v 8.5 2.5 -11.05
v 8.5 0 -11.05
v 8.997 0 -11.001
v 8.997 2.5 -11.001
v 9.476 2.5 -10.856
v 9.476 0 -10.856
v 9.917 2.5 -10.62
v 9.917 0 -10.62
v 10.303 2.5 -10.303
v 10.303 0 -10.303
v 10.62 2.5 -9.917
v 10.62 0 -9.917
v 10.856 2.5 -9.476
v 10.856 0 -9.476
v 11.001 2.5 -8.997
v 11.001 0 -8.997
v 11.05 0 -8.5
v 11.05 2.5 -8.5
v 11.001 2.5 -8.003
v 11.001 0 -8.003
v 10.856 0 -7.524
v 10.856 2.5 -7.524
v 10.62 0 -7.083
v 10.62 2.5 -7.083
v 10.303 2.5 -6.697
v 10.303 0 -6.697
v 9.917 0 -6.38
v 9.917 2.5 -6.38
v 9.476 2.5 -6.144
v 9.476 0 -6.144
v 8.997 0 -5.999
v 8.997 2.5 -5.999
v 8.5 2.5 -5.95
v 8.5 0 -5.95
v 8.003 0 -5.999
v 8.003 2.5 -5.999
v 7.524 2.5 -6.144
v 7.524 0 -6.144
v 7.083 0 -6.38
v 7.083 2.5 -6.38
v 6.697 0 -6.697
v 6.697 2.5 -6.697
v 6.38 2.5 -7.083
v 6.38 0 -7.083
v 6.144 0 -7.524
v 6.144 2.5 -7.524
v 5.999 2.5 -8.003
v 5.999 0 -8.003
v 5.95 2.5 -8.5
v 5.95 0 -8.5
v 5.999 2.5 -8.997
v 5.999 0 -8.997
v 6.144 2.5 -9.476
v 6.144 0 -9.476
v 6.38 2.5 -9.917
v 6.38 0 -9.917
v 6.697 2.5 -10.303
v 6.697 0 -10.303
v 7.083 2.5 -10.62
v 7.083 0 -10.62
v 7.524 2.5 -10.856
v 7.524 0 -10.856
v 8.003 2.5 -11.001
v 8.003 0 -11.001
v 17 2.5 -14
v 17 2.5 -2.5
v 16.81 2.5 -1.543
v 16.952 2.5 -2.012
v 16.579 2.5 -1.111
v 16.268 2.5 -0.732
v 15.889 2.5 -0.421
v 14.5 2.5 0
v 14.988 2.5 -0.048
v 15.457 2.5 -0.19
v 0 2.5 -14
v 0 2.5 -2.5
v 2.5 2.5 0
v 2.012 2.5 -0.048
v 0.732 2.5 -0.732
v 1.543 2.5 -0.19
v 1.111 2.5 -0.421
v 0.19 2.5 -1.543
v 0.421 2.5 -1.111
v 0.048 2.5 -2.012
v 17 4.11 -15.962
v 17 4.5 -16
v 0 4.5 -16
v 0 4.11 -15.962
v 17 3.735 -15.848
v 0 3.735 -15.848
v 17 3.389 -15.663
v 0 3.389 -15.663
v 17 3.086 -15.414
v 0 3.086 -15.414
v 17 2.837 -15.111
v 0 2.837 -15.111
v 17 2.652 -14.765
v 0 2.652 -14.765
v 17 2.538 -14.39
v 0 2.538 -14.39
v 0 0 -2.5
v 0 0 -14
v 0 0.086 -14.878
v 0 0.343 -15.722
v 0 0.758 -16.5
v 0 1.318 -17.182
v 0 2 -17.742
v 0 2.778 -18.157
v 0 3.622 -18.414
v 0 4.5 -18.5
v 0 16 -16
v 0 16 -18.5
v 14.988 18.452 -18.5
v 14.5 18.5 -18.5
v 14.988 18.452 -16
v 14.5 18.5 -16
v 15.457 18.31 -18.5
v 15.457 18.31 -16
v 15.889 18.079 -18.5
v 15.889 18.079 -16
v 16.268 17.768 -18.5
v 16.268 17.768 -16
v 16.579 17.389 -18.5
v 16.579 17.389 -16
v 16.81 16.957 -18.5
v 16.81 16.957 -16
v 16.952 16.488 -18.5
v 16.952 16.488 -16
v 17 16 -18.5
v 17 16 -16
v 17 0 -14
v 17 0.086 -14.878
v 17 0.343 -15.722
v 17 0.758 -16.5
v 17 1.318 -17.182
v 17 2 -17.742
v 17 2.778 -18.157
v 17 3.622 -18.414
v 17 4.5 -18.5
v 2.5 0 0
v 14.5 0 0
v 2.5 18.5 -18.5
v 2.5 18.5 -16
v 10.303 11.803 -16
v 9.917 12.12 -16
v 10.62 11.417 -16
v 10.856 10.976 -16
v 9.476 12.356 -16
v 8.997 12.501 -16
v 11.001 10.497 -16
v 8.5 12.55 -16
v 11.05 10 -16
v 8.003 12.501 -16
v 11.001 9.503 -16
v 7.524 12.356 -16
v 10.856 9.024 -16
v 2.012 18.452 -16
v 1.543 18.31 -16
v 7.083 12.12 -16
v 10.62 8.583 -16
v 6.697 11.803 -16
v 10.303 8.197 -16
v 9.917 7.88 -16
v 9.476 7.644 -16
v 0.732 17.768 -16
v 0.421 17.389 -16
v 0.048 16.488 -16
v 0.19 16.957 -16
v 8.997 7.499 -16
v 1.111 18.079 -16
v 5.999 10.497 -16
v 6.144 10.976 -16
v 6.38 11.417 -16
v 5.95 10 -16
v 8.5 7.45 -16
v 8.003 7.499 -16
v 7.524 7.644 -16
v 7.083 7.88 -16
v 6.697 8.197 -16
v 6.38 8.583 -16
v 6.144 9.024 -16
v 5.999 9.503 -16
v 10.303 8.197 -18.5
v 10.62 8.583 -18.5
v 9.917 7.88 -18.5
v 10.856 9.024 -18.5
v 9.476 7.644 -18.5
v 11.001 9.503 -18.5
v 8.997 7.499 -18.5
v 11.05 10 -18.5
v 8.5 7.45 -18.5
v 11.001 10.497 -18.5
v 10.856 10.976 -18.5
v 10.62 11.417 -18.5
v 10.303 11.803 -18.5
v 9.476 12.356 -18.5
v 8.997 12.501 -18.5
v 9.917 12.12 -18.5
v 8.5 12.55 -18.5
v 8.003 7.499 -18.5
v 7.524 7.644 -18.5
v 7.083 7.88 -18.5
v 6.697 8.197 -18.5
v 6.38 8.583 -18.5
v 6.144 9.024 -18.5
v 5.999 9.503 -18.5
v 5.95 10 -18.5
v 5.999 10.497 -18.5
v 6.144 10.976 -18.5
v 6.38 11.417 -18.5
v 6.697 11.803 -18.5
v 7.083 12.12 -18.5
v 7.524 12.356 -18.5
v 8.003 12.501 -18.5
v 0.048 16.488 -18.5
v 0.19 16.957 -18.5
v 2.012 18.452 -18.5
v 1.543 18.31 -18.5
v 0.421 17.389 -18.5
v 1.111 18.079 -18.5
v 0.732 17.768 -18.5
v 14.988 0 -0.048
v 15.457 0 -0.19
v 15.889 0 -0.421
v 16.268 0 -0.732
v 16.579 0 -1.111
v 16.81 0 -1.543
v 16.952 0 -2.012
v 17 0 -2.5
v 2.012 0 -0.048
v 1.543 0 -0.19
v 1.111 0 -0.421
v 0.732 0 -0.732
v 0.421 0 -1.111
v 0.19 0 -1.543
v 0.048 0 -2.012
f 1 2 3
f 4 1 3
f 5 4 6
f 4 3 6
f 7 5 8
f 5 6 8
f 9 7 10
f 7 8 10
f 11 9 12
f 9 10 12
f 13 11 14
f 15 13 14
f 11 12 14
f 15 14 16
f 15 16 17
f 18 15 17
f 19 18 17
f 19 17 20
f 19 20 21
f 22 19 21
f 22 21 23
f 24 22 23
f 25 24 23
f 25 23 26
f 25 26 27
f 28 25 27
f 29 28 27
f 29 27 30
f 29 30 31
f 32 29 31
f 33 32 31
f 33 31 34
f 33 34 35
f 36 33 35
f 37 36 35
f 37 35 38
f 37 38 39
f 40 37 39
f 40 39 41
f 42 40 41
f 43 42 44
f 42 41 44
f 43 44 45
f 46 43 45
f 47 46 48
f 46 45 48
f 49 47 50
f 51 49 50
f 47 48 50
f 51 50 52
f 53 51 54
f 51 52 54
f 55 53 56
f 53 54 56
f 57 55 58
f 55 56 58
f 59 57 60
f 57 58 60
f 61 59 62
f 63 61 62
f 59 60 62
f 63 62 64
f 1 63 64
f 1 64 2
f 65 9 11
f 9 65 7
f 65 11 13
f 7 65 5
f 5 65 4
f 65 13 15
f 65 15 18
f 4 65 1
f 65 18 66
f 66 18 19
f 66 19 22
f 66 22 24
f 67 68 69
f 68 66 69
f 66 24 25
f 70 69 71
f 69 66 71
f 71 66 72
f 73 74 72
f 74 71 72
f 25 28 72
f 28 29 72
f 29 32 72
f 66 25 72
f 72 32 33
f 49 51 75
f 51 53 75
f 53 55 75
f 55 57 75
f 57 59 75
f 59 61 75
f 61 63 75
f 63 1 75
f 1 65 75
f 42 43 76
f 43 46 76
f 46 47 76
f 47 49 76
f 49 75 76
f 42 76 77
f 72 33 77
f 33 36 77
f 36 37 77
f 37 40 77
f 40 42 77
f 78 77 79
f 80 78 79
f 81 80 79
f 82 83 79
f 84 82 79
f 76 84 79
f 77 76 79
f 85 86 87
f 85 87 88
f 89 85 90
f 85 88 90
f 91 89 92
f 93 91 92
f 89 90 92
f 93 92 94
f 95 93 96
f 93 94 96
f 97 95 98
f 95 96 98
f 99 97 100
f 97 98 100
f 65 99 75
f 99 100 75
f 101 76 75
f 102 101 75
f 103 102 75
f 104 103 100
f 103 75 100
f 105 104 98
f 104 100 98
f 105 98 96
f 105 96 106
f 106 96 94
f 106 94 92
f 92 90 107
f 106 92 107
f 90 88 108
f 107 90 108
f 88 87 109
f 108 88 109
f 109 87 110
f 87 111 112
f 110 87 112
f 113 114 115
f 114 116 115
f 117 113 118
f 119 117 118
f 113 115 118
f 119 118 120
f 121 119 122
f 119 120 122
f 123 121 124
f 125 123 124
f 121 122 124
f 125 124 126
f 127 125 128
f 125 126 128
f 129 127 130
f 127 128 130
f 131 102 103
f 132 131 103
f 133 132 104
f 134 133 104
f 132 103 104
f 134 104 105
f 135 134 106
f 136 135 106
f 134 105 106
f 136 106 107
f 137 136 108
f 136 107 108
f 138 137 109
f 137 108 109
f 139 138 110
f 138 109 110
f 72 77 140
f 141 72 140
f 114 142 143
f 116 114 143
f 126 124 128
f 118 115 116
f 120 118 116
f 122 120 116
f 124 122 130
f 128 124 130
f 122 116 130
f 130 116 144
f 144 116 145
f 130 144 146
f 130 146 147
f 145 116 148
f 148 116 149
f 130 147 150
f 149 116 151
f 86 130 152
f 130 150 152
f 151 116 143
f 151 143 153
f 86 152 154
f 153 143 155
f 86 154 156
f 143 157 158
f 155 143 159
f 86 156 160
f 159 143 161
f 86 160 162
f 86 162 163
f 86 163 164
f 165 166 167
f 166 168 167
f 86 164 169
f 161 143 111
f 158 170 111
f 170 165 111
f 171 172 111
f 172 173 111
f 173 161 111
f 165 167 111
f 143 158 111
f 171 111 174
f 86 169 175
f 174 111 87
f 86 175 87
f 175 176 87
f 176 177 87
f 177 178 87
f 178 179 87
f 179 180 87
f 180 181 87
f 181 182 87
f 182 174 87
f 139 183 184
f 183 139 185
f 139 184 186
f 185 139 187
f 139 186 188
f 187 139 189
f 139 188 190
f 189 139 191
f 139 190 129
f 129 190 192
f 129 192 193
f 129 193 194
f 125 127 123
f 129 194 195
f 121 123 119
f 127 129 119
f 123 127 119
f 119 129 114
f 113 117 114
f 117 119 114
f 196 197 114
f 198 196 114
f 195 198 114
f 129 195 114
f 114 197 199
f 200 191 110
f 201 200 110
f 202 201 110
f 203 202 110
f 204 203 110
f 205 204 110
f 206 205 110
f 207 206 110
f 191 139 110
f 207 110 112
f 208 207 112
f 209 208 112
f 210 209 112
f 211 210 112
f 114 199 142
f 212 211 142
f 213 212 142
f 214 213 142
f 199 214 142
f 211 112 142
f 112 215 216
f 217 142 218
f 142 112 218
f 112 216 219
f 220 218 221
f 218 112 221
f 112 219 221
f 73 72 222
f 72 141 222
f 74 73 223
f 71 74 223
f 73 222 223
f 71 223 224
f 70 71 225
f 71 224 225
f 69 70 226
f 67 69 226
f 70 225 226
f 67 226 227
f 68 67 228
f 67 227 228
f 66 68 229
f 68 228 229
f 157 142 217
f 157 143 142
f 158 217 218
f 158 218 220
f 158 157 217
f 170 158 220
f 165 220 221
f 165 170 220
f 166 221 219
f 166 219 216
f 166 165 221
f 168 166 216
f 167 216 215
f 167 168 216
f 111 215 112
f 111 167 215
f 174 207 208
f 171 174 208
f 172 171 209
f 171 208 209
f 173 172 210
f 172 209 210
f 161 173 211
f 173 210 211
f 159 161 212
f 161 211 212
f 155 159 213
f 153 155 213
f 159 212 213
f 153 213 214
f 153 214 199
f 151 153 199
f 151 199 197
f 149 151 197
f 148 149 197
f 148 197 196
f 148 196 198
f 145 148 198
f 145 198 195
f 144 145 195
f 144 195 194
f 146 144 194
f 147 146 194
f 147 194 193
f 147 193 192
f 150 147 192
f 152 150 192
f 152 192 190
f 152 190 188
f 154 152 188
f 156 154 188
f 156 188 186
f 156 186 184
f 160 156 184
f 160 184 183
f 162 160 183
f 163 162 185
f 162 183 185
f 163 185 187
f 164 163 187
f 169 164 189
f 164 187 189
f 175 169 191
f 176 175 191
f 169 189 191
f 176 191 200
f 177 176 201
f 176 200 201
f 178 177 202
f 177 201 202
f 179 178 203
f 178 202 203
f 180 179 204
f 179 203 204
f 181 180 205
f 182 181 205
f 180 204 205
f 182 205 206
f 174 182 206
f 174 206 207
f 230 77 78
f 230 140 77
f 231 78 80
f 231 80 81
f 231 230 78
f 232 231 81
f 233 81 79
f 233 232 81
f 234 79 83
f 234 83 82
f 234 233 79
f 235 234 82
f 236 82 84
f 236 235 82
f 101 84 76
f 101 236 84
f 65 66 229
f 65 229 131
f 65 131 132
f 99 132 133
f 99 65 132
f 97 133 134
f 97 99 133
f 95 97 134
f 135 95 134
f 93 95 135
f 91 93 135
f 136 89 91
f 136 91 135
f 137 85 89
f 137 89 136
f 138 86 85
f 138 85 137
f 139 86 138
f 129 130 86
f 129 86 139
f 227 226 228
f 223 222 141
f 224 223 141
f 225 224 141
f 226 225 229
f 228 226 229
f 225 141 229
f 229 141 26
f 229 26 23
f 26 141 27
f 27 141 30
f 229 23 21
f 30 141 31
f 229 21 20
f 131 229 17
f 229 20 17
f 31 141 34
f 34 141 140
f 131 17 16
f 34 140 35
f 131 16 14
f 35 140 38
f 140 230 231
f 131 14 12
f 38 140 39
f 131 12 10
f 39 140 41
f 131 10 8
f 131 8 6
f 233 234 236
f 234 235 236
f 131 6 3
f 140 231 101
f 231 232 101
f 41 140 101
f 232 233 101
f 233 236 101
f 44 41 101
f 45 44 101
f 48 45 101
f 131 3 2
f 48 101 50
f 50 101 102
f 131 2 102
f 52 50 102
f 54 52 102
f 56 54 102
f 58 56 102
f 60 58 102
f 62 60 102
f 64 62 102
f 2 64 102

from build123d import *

# Parameters (mm, degrees)
EXTRUDE_1_DEPTH     = 17
FILLET_1_R          = 2.5
SKETCH_2_R          = 2.55
CUT_EXTRUDE_1_DEPTH = 17
SKETCH_3_R          = 2.55
CUT_EXTRUDE_2_DEPTH = 17


with BuildPart() as part:
    # Эскиз1 → Бобышка-Вытянуть1 (new body)
    with BuildSketch(Plane(origin=(0, 0, 0), x_dir=(0, 0, -1), z_dir=(1, 0, 0))):
        with BuildLine():
            Line((14, 2.5), (0, 2.5))
            Line((0, 2.5), (0, 0))
            Line((0, 0), (14, 0))
            ThreePointArc((14, 0), (17.181980515, 1.318019485), (18.5, 4.5))
            Line((18.5, 4.5), (18.5, 18.5))
            Line((18.5, 18.5), (16, 18.5))
            Line((16, 18.5), (16, 4.5))
            ThreePointArc((16, 4.5), (15.414213562, 3.085786438), (14, 2.5))
        make_face()
    extrude(amount=EXTRUDE_1_DEPTH)

    # Скругление1
    fillet_1_edges = [part.edges().sort_by_distance(p)[0] for p in [
        (0, 1.25, 0),
        (17, 18.5, -17.25),
        (17, 1.25, 0),
        (0, 18.5, -17.25),
    ]]
    fillet(fillet_1_edges, radius=FILLET_1_R)

    # Эскиз2 → Вырез-Вытянуть1 (cut)
    with BuildSketch(Plane.XZ):
        with Locations(Location((8.5, -8.5, 0), (0, 0, 270))):
            Circle(SKETCH_2_R)
    extrude(amount=-CUT_EXTRUDE_1_DEPTH, mode=Mode.SUBTRACT)

    # Эскиз3 → Вырез-Вытянуть2 (cut)
    with BuildSketch(Plane(origin=(0, 0, -18.5), x_dir=(-1, 0, 0), z_dir=(0, 0, -1))):
        with Locations((-8.5, 10)):
            Circle(SKETCH_3_R)
    extrude(amount=-CUT_EXTRUDE_2_DEPTH, mode=Mode.SUBTRACT)


solid = part.part
